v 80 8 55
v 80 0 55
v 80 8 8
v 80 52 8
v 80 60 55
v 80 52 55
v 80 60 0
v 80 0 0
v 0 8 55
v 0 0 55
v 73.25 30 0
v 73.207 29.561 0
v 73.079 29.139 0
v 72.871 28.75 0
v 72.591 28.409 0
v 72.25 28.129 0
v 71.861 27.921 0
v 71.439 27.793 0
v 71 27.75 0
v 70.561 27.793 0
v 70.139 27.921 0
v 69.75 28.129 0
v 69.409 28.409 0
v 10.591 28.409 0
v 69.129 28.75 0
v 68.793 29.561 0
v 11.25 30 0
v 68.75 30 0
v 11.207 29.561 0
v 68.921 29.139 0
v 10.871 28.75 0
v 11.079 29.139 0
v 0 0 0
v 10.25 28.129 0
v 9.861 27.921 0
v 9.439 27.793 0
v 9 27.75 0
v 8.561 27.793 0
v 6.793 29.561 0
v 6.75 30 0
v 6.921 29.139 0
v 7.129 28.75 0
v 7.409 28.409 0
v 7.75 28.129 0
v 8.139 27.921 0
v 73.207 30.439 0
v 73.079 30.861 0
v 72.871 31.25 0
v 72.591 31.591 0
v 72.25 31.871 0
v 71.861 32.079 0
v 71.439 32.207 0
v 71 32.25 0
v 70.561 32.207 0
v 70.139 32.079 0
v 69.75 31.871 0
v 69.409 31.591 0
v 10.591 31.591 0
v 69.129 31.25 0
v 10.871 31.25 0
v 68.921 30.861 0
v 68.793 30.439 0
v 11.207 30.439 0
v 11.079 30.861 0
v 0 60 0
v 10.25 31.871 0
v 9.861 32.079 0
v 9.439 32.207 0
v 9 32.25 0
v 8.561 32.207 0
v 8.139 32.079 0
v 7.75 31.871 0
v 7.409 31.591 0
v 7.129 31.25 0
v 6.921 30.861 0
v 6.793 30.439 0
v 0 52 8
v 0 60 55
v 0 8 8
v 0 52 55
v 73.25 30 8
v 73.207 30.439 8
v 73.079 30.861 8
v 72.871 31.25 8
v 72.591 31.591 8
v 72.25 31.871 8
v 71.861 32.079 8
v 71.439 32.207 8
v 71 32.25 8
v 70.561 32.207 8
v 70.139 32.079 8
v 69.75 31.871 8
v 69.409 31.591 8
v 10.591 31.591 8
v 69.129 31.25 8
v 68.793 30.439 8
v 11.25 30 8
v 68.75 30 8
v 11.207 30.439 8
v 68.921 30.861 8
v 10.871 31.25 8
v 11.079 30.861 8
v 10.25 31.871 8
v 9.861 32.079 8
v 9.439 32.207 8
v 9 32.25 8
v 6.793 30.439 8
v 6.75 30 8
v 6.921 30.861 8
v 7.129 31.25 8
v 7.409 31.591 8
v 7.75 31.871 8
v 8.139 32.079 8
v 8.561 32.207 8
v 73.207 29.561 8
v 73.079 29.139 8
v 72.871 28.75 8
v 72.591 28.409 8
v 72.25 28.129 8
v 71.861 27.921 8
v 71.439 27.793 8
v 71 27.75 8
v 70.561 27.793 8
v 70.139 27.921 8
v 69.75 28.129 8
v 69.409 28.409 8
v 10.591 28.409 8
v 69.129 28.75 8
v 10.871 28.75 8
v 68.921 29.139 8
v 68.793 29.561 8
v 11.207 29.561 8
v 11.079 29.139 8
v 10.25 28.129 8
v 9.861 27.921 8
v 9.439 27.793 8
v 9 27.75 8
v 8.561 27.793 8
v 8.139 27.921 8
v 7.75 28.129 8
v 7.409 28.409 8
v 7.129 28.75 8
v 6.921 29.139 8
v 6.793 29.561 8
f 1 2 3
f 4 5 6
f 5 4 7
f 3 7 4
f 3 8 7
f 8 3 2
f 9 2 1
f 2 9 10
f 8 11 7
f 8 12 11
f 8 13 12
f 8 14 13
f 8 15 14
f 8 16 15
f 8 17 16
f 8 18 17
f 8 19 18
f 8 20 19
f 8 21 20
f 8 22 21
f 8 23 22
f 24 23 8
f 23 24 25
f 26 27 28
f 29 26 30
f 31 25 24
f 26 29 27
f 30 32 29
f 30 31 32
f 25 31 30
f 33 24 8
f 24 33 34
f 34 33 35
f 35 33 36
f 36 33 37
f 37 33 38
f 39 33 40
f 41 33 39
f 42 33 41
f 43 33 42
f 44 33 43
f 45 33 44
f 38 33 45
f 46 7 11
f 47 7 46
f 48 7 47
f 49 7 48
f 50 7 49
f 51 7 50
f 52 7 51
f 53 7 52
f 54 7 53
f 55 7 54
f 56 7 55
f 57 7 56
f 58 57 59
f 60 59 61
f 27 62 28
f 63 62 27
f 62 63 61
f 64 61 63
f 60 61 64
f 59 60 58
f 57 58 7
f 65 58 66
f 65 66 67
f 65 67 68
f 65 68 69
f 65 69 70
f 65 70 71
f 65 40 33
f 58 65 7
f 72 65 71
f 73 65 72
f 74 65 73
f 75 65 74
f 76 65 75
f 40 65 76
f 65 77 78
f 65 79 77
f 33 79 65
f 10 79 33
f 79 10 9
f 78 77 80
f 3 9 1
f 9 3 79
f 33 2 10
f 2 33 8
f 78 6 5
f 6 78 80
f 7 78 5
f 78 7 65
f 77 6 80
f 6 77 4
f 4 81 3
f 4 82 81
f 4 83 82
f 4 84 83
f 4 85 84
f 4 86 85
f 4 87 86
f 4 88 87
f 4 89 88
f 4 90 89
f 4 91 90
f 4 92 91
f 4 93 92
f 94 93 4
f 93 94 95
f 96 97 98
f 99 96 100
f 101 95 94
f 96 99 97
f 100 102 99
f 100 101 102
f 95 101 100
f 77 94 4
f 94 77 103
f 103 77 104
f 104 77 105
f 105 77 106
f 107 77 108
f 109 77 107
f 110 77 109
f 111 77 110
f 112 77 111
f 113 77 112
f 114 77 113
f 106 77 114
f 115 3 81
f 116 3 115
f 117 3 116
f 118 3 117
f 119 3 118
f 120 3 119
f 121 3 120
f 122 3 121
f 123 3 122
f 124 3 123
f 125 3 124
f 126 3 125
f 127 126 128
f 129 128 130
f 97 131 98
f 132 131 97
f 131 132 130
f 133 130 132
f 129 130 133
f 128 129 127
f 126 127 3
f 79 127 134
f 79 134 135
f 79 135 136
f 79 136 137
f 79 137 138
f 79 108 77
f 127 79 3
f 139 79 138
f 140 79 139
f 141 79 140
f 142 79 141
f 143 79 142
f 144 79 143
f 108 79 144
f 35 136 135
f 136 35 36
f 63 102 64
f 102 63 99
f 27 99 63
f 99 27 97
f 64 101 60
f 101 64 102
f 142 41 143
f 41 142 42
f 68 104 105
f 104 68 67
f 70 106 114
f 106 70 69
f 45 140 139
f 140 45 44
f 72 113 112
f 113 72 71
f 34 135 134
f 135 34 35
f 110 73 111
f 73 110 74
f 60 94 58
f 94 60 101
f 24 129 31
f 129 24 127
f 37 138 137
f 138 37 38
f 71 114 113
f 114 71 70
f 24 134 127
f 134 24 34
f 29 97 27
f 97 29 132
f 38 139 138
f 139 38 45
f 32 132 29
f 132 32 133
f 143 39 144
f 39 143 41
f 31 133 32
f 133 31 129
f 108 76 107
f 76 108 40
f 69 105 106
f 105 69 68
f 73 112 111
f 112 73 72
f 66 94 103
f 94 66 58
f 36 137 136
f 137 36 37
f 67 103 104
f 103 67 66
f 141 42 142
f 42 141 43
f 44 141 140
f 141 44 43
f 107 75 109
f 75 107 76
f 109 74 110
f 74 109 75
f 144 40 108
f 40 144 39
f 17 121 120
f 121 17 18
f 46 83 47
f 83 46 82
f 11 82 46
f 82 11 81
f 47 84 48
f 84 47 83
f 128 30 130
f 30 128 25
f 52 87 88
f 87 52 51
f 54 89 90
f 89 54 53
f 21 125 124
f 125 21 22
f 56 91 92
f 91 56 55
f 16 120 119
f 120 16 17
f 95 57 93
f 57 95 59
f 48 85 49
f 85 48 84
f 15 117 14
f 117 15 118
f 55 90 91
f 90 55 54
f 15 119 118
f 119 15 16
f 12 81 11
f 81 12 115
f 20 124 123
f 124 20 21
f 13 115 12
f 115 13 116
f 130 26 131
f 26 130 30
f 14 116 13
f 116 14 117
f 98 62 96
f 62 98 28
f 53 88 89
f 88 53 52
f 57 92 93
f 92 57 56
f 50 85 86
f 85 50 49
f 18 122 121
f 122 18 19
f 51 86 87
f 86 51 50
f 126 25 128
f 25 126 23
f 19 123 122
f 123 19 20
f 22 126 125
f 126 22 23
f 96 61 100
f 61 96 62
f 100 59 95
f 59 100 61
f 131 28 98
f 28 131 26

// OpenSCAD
$fn = 32;

// ----------------------------------------------------------------------
// U-bracket: 80 x 60 x 55 mm
// ----------------------------------------------------------------------

// --- parameters (mm) ---
length = 80;              // outer length, X
width = 60;               // outer width, Y
height = 55;              // upright height, Z
thick = 8;                // wall thickness
hole_d = 4.5;             // clearance for M4

module hole_z(px, py) {
  translate([px, py, -2.5]) cylinder(h = thick + 5, d = hole_d);
}
module hole_y_pz(pz) {
  /* through both uprights along Y */
  translate([0, -2.5, pz]) rotate([-90, 0, 0]) cylinder(h = width + 5, d = hole_d);
}

module base() {
  cube([length, width, thick]);
}

module uprights() {
  cube([length, thick, height]);
  translate([0, width - thick, 0]) cube([length, thick, height]);
}

difference() {
  union() {
    base();
    uprights();
  }
  hole_z(9, 30);
  hole_z(71, 30);
}
